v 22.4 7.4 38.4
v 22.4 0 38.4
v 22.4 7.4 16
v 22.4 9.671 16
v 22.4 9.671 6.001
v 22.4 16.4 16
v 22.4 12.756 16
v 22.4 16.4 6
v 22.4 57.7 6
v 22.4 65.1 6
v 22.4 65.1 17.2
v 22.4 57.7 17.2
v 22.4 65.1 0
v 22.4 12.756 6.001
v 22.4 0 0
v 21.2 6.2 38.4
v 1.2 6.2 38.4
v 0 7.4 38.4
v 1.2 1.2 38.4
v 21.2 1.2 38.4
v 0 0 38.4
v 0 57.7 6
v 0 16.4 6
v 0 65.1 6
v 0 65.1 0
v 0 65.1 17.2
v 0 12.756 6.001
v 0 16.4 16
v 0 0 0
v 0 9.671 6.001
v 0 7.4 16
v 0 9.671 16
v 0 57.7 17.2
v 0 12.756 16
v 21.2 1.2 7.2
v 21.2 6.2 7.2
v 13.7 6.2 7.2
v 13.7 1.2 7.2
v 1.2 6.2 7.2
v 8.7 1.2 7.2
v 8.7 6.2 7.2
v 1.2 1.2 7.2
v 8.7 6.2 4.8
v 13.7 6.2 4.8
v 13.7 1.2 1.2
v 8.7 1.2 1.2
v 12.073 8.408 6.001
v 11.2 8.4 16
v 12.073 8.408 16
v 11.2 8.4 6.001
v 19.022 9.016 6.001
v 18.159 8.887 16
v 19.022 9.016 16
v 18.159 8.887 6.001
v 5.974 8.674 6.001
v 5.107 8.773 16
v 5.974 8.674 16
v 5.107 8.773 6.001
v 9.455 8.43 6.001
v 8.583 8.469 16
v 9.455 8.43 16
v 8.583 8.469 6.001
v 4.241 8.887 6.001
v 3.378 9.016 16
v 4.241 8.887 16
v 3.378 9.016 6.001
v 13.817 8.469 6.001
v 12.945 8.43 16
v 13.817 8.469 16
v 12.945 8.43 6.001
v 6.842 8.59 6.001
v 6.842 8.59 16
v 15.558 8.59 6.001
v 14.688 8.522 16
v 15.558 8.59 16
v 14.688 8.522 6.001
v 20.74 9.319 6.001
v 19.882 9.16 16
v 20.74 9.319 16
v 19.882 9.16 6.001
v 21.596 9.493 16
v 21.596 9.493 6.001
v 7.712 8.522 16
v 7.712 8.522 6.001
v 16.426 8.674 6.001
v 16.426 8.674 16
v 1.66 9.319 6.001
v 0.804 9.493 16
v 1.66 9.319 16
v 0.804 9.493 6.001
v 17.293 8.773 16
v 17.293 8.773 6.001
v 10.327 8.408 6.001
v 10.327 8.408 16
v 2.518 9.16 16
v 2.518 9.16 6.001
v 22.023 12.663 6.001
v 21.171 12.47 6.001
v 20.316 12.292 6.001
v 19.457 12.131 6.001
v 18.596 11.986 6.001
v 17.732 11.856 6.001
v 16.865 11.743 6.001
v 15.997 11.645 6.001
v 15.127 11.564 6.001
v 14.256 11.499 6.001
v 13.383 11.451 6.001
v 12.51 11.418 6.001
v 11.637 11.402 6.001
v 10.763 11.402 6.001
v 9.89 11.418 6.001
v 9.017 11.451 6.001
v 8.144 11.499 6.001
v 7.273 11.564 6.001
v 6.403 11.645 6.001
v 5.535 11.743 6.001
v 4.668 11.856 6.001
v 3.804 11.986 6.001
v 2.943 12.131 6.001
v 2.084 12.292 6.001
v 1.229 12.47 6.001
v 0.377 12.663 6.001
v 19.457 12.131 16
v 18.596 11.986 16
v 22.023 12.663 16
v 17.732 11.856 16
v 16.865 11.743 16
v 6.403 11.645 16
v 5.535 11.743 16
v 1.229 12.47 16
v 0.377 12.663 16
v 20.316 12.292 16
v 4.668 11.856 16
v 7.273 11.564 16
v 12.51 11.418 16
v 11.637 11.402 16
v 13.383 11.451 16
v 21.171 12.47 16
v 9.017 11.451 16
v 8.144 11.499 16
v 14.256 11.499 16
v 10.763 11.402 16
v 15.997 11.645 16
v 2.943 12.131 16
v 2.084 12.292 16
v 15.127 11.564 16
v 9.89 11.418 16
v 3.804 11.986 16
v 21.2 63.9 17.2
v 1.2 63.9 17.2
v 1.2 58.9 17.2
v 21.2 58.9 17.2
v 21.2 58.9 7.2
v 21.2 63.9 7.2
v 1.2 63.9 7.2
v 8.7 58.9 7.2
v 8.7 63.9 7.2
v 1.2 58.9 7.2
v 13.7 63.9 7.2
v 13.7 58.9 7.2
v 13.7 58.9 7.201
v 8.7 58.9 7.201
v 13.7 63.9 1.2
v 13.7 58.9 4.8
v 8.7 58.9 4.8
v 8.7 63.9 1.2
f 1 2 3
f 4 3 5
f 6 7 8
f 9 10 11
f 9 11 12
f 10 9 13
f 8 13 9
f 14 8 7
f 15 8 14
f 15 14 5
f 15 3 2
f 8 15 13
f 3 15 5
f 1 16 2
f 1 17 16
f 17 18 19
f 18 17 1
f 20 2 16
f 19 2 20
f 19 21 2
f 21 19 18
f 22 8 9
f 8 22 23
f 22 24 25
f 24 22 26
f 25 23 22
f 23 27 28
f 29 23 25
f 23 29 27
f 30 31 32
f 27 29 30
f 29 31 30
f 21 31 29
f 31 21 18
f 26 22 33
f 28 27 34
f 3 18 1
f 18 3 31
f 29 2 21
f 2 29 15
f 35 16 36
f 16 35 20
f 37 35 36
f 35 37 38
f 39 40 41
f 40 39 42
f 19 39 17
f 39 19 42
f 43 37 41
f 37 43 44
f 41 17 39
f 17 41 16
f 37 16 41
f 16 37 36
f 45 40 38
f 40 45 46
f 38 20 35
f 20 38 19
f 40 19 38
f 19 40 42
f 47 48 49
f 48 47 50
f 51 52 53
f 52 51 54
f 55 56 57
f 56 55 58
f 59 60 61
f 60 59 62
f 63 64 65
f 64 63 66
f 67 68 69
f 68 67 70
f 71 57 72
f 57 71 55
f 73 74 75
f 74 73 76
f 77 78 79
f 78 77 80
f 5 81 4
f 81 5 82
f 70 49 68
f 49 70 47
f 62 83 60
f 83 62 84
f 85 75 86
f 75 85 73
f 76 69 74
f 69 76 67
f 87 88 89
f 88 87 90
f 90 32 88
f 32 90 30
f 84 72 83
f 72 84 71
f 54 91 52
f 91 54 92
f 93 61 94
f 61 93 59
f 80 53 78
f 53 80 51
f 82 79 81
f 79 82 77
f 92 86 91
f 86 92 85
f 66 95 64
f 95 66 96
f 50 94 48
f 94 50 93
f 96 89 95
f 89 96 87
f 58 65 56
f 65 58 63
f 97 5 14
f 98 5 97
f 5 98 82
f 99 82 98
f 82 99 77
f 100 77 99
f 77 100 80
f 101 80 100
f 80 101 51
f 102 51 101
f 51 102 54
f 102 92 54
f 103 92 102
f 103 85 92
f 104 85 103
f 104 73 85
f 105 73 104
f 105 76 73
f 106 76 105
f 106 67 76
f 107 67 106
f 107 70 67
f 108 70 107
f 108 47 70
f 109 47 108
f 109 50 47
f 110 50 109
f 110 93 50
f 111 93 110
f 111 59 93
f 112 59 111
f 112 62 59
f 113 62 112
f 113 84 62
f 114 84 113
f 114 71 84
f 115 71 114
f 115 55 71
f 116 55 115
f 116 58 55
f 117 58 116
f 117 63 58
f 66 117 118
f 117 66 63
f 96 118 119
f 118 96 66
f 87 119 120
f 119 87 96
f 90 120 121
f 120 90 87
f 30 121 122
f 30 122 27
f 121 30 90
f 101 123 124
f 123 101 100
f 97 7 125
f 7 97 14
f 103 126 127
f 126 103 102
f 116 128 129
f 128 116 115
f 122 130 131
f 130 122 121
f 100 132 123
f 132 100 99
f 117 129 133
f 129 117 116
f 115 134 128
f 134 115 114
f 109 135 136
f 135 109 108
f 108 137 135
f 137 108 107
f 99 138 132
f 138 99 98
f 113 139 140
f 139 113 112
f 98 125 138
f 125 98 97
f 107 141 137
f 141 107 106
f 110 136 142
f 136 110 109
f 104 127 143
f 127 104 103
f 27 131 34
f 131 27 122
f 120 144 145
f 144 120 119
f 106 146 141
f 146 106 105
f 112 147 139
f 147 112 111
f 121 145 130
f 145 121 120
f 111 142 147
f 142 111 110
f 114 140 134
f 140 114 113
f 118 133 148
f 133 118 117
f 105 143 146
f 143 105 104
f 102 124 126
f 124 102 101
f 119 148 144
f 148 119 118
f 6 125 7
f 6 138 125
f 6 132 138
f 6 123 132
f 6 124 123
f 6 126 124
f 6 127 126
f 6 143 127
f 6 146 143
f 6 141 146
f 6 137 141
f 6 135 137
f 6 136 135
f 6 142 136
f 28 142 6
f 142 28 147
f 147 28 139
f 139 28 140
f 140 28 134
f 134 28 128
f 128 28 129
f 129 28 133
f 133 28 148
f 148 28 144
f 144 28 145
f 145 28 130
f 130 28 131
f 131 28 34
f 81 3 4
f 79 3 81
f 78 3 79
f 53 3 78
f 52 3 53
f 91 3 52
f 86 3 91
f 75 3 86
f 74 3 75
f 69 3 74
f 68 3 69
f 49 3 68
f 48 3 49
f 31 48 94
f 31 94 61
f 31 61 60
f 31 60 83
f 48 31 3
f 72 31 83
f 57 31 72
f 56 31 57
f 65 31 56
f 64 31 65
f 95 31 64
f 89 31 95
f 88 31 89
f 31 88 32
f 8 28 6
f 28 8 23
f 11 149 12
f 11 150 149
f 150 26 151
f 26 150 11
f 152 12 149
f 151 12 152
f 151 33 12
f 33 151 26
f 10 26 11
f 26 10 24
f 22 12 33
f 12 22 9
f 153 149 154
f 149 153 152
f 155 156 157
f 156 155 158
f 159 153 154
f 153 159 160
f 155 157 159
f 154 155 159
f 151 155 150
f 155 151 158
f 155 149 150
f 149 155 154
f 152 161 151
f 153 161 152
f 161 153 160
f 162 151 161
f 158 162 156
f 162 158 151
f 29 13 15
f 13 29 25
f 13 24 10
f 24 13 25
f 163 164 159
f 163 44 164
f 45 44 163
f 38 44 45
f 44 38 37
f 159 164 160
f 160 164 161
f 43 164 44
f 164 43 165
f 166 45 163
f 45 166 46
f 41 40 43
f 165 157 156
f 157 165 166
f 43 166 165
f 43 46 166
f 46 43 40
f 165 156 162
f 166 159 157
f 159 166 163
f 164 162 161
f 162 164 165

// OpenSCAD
$fa = 1;
$fs = 0.875;

// Configurable variables
moisture_sensor_inset = 50;
pot_rim_thickness = 3;
pot_diameter = 100;

// Internal variables
moisture_sensor_bar_thickness = 6;

wall_thickness = 1.2;
esp_board_width = 20;
esp_board_length = 30;
esp_board_thickness = 5;

moisture_sensor_width = 20;
moisture_sensor_thickness = 2;
moisture_sensor_controller_height = 10;
moisture_sensor_controller_thickness = 5;

// Helpful calculated variables
pot_radius = pot_diameter / 2;
widest_board_width = max(esp_board_width, moisture_sensor_width);
full_outer_width = widest_board_width + wall_thickness * 2;

moisture_sensor_case_outer_thickness = moisture_sensor_controller_thickness + wall_thickness * 2;
pot_inner_distance = esp_board_thickness + wall_thickness * 2 + 1 + pot_rim_thickness;

difference() {
    // Main case body
    union() {
        // Bar that connects to the sensor to controller
        difference() {
            cube([
                full_outer_width,
                pot_inner_distance + moisture_sensor_inset + moisture_sensor_case_outer_thickness / 2,
                moisture_sensor_bar_thickness,
            ]);
        }

        // Case for the controller
        translate([0, 0, moisture_sensor_bar_thickness])
        difference() {
            cube([
                widest_board_width + wall_thickness * 2,
                esp_board_thickness + wall_thickness * 2,
                esp_board_length + wall_thickness * 2,
            ]);

            translate([wall_thickness, wall_thickness, wall_thickness])
            cube([
                widest_board_width,
                esp_board_thickness,
                esp_board_length + wall_thickness * 2,
            ]);
        }

        // Slot for the pot edge
        difference() {
            translate([
                0,
                esp_board_thickness + wall_thickness * 2,
                moisture_sensor_bar_thickness,
            ])
            cube([full_outer_width, pot_rim_thickness * 3, 10]);

            translate([
                full_outer_width / 2,
                pot_radius + esp_board_thickness + wall_thickness * 2 + 1,
                moisture_sensor_bar_thickness + 0.001,
            ])
            difference() {
                cylinder(r = pot_radius, h = 10 + 0.001);
                translate([0, 0, -0.001])
                cylinder(r = pot_radius - pot_rim_thickness, h = 10 + 0.002);
            }
        }

        // Case for the moisture sensor
        translate([
            0,
            pot_inner_distance + moisture_sensor_inset - moisture_sensor_case_outer_thickness / 2,
            moisture_sensor_bar_thickness,
        ])
        difference() {
            cube([
                full_outer_width,
                moisture_sensor_case_outer_thickness,
                moisture_sensor_controller_height + wall_thickness,
            ]);

            translate([wall_thickness, wall_thickness, wall_thickness])
            cube([
                widest_board_width,
                moisture_sensor_controller_thickness,
                moisture_sensor_controller_height + 0.001,
            ]);
        }
    }

    // Cut-out for cables etc
    union() {
        // gap through the bar
        translate([
            full_outer_width / 2 - 2.5,
            wall_thickness,
            wall_thickness,
        ])
        cube([
            5,
            pot_inner_distance + moisture_sensor_inset + moisture_sensor_case_outer_thickness / 2 - wall_thickness * 2,
            moisture_sensor_bar_thickness - wall_thickness * 2,
        ]);

        // gap in the controller case
        translate([
            full_outer_width / 2 - 2.5,
            wall_thickness,
            wall_thickness,
        ])
        cube([
            5,
            esp_board_thickness,
            moisture_sensor_bar_thickness + 0.001,
        ]);

        // gap in the sensor case
        translate([
            full_outer_width / 2 - 2.5,
            pot_inner_distance + moisture_sensor_inset - moisture_sensor_case_outer_thickness / 2 + wall_thickness,
            wall_thickness,
        ])
        cube([
            5,
            moisture_sensor_controller_thickness,
            moisture_sensor_bar_thickness + 0.001,
        ]);
    }
}
